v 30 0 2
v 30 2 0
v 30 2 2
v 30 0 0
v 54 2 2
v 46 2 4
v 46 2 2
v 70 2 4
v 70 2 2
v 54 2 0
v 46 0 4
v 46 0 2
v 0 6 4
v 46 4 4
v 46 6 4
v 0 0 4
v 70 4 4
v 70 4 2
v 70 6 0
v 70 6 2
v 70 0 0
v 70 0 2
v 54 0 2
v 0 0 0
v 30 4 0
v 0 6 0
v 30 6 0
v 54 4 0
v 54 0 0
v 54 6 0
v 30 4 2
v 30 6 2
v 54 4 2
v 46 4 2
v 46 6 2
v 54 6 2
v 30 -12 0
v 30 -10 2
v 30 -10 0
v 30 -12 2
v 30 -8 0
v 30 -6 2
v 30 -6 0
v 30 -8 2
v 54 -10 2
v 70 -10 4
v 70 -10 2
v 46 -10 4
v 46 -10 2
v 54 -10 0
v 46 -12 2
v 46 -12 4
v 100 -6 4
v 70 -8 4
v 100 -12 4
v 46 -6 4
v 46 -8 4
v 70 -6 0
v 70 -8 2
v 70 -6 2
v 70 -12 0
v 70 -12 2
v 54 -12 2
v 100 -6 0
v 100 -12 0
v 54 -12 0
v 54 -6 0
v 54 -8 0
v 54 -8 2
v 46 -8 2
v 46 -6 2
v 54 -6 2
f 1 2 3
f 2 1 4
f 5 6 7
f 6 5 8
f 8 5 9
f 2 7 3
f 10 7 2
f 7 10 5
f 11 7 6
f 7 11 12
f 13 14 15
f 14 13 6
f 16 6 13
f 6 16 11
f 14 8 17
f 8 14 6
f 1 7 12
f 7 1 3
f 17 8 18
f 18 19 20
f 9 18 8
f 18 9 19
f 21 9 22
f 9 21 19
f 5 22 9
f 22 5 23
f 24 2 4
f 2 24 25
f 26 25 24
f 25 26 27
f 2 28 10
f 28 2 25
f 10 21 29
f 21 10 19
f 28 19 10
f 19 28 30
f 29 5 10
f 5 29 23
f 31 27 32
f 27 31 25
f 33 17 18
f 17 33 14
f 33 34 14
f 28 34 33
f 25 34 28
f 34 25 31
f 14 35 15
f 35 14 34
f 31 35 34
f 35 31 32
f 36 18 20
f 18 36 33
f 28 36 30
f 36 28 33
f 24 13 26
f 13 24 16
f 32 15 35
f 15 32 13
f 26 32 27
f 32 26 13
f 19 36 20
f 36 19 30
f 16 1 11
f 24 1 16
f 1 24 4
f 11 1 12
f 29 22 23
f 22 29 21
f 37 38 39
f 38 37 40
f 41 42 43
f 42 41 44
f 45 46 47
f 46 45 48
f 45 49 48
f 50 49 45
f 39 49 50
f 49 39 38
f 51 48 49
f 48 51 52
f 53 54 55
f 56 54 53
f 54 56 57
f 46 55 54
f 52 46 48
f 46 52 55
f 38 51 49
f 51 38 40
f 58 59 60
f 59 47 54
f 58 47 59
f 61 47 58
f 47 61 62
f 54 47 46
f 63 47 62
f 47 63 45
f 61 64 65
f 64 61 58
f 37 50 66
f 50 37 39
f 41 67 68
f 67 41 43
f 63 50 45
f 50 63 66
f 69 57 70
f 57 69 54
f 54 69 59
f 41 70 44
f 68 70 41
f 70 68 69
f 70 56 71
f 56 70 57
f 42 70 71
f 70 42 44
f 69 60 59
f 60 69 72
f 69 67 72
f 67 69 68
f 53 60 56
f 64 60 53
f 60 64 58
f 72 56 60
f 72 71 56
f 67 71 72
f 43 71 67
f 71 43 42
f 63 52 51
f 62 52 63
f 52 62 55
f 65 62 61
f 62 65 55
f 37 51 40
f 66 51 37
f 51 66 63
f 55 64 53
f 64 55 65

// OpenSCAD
/* ******** FREE VAR ******** */

// Length of wood dedicated to the join
join_length = 40;

// Length of wood shown beyond the join
extra_length = 30;

// Size of wood
height = 4;
width =  6;

// Length of "wings" — must be less than
// (join_length - height) / 2
wing_length = 16;

// Used to make things bigger so boolean
// operations apply more cleanly
tolerance = 2;

/* ******** COMPUTED ******** */

total_length = join_length + extra_length;
side_width = width / 3;
wing_height = height / 2;

/* ********  THINGS  ******** */

module wood() {
    cube([
        join_length + extra_length,
        width,
        height
    ]);
}

module _wing_clip() {
    diagon = sqrt(2 * wing_height * wing_height);

    translate([
        -diagon / 2,
        0,
        -diagon / 8
    ]) rotate([
        0,
        45,
        0
    ]) cube([
        wing_height,
        width + tolerance * 2,
        wing_height
    ]);
}

module _wing() {
    translate([
        extra_length,
        -tolerance,
        wing_height
    ]) cube([
        wing_length,
        width + tolerance * 2,
        wing_height
    ]);
}

module _side(y) {
    difference() {
        translate([
            extra_length,
            y - tolerance,
            -tolerance
        ]) cube([
            join_length + tolerance,
            side_width + tolerance,
            height + tolerance * 2
        ]);

        _wing();

        translate ([
            join_length - wing_length,
            0,
            -wing_height
        ]) _wing();
    }
}

module _sideA() {
    _side(0);
}

module _sideB() {
    _side(2 * side_width + tolerance);
}


module partA() {
    color("white") difference() {
        wood();
        _sideA();
        _sideB();
    }
}

module partB() {
    color("blue") difference() {
        translate([
            extra_length,
            0,
            0
        ]) wood();

        partA();
    }
}


module side_by_side() {
    partA();

    translate([
        0,
        -width * 2,
        0
    ]) partB();
}

module insertion_before() {
    partA();

    translate([
        extra_length + wing_length / 1.5,
        0,
        -wing_length
    ]) rotate([
        0,
        -60,
        0
    ]) partB();
}


module insertion_during() {
    partA();

    translate([
        extra_length,
        0,
        -(extra_length + wing_length / 2)
    ]) rotate([
        0,
        -60,
        0
    ]) partB();
}

module insertion_after() {
    partA();

    translate([
        2,
        0,
        -wing_length + 3
    ]) rotate([
        0,
        -15,
        0
    ]) partB();
}

side_by_side();
//insertion_before();
//insertion_during();
//insertion_after();
